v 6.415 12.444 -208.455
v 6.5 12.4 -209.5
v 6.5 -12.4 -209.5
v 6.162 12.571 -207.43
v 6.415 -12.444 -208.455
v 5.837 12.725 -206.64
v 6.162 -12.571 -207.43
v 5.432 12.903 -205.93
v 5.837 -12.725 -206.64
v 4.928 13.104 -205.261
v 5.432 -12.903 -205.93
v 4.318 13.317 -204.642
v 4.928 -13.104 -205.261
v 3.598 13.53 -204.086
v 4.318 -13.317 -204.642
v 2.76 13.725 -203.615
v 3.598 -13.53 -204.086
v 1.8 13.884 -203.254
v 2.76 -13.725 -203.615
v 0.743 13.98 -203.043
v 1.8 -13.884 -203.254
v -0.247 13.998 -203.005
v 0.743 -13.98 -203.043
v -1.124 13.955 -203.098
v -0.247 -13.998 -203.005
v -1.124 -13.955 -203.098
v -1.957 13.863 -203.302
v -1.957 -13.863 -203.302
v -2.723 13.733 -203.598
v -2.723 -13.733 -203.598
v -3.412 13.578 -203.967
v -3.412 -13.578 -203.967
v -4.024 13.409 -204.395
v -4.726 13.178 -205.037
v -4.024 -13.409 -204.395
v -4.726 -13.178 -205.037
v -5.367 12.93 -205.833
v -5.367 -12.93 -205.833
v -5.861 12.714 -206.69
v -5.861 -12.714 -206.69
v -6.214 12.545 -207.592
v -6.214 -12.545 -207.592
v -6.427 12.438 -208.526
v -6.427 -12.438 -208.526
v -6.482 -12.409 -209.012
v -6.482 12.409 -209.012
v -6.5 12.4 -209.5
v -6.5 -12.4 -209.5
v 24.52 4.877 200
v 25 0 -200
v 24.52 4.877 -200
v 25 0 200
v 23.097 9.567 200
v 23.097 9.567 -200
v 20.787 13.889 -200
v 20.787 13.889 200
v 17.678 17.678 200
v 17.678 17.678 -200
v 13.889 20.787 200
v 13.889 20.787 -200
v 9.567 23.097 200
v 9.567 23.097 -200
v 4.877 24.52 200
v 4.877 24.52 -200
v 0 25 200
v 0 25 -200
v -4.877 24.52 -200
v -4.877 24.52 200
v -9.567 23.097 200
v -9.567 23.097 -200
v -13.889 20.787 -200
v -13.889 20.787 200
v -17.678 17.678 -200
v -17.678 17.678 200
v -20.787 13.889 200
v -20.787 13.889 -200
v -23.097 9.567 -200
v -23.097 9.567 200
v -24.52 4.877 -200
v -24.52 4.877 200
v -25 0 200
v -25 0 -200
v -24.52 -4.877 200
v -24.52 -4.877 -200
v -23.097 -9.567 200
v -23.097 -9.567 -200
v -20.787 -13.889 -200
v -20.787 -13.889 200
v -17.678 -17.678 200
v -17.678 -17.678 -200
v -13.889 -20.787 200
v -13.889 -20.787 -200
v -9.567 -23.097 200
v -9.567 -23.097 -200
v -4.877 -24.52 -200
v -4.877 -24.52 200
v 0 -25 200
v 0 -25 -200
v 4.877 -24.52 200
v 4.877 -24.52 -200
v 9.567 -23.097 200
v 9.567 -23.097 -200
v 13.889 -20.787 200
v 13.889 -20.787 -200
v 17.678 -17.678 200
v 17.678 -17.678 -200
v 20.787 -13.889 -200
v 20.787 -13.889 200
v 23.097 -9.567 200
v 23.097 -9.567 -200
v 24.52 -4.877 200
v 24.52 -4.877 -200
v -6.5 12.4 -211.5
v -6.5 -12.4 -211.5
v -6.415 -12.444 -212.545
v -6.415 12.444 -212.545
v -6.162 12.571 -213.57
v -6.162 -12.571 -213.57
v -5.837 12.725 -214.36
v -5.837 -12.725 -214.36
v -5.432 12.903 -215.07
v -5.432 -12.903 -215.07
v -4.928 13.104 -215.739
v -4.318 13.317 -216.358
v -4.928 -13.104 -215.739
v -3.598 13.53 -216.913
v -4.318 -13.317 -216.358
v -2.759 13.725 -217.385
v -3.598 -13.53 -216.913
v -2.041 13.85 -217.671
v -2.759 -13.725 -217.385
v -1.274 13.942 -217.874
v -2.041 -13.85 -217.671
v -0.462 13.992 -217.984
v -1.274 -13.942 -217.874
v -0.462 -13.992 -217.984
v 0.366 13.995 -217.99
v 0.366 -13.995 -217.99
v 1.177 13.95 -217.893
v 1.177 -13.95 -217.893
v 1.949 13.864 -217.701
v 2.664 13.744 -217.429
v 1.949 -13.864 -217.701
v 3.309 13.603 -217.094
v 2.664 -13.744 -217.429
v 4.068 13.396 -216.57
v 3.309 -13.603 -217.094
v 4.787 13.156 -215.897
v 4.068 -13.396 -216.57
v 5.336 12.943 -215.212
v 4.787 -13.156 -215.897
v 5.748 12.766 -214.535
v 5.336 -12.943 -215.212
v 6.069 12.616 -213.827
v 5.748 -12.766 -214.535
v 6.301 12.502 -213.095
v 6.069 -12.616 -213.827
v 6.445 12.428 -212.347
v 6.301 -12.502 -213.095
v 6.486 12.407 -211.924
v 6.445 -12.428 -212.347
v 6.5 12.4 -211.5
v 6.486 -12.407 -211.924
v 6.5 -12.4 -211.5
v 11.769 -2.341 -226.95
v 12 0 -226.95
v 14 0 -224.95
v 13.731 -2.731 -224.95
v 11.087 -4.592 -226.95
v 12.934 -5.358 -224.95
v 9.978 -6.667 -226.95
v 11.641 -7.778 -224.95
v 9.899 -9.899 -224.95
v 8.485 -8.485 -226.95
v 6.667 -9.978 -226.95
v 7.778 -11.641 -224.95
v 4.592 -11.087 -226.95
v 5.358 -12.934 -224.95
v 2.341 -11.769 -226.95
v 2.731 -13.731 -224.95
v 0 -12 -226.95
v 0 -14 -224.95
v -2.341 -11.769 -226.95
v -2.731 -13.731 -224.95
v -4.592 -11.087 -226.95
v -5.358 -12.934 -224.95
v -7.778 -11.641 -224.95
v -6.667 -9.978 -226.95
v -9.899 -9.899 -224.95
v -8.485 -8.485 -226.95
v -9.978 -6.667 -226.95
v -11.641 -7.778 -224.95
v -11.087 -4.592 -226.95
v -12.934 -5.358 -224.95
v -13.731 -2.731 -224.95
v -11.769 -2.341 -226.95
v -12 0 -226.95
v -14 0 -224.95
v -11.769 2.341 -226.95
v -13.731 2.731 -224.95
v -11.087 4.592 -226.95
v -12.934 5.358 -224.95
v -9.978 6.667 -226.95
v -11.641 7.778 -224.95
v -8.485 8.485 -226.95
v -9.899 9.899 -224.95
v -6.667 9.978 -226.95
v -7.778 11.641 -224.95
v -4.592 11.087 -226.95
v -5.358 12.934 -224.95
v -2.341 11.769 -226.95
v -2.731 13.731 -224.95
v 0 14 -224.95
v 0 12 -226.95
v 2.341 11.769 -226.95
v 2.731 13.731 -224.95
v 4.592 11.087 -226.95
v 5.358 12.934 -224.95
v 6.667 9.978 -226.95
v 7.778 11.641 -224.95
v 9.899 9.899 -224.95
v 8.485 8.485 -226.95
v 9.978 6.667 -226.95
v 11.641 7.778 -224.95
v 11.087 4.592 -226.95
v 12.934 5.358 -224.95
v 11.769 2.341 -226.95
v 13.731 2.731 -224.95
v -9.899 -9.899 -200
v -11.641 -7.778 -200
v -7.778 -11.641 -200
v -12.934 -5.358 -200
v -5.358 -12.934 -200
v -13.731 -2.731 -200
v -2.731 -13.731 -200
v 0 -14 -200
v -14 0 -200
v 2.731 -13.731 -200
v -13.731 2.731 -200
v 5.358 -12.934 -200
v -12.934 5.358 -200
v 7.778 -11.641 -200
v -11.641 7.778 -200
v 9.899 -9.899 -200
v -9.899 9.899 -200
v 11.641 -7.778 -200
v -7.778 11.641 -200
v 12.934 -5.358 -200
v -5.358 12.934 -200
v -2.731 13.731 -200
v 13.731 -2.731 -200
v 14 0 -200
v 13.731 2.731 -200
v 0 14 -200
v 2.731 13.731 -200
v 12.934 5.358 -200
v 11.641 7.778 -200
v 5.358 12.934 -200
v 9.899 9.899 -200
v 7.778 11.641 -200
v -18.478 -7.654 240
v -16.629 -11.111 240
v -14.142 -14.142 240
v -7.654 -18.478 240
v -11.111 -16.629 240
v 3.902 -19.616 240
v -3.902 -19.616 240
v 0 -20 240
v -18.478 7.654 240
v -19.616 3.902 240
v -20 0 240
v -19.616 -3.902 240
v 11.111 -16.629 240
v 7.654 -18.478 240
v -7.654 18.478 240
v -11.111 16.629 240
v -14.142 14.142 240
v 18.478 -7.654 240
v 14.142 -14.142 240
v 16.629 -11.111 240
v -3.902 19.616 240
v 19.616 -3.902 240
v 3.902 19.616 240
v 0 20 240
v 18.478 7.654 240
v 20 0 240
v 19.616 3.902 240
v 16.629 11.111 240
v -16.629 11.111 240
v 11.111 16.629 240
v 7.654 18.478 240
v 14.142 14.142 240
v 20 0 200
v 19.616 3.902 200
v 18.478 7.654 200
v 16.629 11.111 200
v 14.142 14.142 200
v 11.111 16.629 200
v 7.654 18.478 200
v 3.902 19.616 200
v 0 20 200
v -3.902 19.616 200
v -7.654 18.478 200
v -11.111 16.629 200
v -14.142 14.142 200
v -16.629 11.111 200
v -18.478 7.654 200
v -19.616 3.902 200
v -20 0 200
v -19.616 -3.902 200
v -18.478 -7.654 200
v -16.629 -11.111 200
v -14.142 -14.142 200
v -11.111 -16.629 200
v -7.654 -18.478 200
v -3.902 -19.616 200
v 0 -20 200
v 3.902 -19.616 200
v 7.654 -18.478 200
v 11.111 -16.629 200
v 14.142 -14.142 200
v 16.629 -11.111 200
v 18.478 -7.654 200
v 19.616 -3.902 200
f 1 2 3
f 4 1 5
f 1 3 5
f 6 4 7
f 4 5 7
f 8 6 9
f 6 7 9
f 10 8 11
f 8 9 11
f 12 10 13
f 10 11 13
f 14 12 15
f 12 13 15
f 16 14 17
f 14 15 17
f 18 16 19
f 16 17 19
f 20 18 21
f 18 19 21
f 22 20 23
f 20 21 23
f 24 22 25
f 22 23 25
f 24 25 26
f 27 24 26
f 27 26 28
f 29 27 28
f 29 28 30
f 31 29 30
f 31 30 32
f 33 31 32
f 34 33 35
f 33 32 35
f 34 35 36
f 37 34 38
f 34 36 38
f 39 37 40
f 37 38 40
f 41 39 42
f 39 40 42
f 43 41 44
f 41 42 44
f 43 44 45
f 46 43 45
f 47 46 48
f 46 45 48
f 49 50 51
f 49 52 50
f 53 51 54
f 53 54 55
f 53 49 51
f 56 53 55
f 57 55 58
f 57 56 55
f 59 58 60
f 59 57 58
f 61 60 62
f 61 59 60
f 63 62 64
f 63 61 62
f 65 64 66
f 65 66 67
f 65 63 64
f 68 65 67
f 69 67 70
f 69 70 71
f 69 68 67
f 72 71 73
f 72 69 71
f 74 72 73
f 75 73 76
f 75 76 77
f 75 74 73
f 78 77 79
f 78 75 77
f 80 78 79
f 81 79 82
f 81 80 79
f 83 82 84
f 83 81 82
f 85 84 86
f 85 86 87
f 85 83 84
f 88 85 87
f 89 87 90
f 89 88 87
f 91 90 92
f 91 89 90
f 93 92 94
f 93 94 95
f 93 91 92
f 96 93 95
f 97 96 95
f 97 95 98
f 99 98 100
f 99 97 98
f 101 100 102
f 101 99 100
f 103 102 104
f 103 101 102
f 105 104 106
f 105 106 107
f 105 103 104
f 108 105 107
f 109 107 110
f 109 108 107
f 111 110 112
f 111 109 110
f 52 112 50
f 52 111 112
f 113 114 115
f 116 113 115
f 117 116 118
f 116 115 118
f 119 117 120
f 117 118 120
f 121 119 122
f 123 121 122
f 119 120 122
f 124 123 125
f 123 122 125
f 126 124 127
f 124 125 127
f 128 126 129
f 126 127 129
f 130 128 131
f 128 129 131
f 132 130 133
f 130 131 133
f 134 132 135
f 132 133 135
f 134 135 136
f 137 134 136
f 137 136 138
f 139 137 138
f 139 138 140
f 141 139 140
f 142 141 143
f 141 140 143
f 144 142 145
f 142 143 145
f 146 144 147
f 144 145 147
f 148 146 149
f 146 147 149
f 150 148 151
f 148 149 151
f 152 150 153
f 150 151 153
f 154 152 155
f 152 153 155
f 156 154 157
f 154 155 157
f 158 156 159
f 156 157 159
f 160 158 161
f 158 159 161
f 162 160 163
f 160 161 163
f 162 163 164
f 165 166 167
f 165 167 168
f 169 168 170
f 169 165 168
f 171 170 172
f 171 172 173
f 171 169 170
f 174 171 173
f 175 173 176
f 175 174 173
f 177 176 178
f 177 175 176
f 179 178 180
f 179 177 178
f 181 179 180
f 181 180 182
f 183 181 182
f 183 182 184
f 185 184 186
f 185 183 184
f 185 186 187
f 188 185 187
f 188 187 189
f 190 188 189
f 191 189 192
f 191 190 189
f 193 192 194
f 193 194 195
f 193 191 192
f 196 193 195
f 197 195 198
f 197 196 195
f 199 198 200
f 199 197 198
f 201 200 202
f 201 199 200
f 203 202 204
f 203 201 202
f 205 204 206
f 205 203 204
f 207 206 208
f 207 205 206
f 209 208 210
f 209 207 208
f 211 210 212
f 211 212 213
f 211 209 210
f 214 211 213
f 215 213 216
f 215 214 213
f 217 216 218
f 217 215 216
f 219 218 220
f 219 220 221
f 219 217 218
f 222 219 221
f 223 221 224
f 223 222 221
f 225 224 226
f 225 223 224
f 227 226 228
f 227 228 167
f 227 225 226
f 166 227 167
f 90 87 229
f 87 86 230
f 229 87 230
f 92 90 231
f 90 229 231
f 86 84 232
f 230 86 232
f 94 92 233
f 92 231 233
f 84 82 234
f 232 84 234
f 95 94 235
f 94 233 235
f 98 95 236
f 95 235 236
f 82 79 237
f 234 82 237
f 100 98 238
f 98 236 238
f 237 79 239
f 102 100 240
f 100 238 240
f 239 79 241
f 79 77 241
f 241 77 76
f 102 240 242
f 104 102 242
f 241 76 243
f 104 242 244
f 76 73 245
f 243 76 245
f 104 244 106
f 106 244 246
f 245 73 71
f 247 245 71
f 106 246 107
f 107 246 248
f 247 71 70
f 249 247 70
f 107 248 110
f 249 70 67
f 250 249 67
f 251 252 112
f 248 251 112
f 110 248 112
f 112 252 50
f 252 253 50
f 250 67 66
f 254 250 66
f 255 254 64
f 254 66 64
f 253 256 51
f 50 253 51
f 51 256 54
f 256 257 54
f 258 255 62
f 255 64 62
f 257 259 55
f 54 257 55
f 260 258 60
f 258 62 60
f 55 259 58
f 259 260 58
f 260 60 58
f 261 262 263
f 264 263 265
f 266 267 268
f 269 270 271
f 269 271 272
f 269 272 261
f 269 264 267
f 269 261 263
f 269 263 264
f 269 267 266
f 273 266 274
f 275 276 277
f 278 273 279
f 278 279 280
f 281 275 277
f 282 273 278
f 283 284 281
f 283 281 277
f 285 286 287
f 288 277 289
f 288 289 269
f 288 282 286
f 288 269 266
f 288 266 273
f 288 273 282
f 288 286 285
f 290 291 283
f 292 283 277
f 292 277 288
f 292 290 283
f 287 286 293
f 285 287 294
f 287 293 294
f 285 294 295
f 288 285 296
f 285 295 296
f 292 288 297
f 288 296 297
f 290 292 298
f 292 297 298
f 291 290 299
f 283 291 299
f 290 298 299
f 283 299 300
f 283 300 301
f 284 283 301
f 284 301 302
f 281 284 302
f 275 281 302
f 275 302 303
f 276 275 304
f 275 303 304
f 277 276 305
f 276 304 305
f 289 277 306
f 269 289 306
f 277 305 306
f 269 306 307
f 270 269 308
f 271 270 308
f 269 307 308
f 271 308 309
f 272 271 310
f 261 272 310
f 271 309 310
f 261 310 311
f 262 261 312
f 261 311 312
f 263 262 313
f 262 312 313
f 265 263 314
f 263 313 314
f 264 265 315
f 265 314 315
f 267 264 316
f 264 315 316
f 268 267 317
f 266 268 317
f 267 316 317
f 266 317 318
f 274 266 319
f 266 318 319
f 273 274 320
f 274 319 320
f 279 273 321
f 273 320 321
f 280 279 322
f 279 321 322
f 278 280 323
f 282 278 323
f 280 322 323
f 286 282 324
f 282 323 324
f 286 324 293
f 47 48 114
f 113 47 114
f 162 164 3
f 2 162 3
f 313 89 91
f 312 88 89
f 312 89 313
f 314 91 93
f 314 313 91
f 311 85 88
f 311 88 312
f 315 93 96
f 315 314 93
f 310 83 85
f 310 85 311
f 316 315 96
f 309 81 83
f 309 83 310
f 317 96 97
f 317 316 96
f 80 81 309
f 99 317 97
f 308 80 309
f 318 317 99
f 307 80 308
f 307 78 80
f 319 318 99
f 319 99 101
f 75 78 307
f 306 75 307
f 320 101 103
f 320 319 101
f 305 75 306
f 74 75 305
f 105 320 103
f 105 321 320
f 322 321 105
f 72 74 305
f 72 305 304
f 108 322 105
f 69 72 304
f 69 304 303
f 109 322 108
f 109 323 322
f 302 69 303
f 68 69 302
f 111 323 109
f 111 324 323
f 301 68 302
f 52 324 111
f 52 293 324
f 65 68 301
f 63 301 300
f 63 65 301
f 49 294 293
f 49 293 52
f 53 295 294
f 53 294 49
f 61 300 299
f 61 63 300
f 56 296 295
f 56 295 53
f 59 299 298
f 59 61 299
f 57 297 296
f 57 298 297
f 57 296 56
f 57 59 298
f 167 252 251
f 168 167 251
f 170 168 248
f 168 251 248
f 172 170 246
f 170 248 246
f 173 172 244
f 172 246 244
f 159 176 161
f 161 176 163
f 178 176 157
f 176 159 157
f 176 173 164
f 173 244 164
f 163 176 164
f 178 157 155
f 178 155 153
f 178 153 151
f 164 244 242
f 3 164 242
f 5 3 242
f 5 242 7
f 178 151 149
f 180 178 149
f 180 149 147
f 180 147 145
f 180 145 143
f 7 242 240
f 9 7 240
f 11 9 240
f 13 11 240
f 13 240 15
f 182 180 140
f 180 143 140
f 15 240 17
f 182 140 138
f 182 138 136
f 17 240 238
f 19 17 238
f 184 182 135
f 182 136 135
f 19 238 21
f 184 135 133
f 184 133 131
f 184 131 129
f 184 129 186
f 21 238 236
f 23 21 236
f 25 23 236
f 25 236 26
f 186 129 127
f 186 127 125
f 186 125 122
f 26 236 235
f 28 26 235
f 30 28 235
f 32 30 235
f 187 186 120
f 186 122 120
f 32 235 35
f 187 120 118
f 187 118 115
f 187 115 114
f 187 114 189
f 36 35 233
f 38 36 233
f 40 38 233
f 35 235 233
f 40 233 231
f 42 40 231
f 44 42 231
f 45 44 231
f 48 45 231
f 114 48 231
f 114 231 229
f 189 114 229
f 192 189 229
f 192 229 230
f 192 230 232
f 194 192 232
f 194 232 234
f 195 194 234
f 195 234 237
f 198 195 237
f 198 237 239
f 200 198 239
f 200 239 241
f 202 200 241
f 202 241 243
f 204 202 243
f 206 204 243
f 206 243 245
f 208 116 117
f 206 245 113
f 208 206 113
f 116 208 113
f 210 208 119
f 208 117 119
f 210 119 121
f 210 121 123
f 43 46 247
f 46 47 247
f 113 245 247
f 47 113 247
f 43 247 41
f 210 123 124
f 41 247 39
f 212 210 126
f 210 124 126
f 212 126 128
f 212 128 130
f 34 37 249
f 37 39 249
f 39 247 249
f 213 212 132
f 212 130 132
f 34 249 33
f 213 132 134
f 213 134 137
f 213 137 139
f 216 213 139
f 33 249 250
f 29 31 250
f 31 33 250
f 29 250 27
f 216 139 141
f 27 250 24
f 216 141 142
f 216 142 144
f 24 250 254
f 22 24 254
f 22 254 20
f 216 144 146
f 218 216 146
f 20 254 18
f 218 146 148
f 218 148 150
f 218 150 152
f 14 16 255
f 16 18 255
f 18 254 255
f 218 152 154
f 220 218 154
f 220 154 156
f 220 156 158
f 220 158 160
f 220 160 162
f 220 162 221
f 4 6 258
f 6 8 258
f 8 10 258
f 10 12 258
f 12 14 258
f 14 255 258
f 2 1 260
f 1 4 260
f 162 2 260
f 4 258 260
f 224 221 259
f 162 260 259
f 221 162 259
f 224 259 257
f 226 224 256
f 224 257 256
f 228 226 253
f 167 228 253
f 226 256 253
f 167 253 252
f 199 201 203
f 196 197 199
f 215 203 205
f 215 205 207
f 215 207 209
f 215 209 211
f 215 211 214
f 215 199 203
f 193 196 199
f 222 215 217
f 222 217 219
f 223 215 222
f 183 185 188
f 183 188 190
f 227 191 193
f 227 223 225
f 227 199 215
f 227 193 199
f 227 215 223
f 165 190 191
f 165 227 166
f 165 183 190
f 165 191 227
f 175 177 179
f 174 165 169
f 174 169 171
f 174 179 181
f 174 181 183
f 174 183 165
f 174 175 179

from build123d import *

# Parameters (mm, degrees)
F0_R     = 25
F1_DEPTH = 200
F2_R     = 20
F3_DEPTH = 40
F4_R     = 14
F5_DEPTH = 26.95
F7_DEPTH = 25
F8_SIZE  = 2


with BuildPart() as f1:
    # F0 (on Top) → F1 (new body, symmetric)
    with BuildSketch(Plane.XY):
        Circle(F0_R)
    extrude(amount=F1_DEPTH, both=True)

    # F2 (on face) → F3 (join)
    with BuildSketch(Plane.XY.offset(200)):
        Circle(F2_R)
    extrude(amount=F3_DEPTH)

    # F4 (on face) → F5 (join)
    with BuildSketch(Plane(origin=(0, 0, -200), x_dir=(1, 0, 0), z_dir=(0, 0, -1))):
        Circle(F4_R)
    extrude(amount=F5_DEPTH)

    # F6 (on Front) → F7 (cut, symmetric)
    with BuildSketch(Plane.XZ):
        with BuildLine():
            ThreePointArc((6.5, -209.5), (0, -203), (-6.5, -209.5))
            Line((-6.5, -209.5), (-6.5, -211.5))
            ThreePointArc((-6.5, -211.5), (0, -218), (6.5, -211.5))
            Line((6.5, -211.5), (6.5, -209.5))
        make_face()
    extrude(amount=F7_DEPTH, both=True, mode=Mode.SUBTRACT)

    # F8
    f8_edges = [f1.edges().sort_by_distance(p)[0] for p in [
        (-14, 0, -226.95),
    ]]
    chamfer(f8_edges, length=F8_SIZE)


solid = f1.part
